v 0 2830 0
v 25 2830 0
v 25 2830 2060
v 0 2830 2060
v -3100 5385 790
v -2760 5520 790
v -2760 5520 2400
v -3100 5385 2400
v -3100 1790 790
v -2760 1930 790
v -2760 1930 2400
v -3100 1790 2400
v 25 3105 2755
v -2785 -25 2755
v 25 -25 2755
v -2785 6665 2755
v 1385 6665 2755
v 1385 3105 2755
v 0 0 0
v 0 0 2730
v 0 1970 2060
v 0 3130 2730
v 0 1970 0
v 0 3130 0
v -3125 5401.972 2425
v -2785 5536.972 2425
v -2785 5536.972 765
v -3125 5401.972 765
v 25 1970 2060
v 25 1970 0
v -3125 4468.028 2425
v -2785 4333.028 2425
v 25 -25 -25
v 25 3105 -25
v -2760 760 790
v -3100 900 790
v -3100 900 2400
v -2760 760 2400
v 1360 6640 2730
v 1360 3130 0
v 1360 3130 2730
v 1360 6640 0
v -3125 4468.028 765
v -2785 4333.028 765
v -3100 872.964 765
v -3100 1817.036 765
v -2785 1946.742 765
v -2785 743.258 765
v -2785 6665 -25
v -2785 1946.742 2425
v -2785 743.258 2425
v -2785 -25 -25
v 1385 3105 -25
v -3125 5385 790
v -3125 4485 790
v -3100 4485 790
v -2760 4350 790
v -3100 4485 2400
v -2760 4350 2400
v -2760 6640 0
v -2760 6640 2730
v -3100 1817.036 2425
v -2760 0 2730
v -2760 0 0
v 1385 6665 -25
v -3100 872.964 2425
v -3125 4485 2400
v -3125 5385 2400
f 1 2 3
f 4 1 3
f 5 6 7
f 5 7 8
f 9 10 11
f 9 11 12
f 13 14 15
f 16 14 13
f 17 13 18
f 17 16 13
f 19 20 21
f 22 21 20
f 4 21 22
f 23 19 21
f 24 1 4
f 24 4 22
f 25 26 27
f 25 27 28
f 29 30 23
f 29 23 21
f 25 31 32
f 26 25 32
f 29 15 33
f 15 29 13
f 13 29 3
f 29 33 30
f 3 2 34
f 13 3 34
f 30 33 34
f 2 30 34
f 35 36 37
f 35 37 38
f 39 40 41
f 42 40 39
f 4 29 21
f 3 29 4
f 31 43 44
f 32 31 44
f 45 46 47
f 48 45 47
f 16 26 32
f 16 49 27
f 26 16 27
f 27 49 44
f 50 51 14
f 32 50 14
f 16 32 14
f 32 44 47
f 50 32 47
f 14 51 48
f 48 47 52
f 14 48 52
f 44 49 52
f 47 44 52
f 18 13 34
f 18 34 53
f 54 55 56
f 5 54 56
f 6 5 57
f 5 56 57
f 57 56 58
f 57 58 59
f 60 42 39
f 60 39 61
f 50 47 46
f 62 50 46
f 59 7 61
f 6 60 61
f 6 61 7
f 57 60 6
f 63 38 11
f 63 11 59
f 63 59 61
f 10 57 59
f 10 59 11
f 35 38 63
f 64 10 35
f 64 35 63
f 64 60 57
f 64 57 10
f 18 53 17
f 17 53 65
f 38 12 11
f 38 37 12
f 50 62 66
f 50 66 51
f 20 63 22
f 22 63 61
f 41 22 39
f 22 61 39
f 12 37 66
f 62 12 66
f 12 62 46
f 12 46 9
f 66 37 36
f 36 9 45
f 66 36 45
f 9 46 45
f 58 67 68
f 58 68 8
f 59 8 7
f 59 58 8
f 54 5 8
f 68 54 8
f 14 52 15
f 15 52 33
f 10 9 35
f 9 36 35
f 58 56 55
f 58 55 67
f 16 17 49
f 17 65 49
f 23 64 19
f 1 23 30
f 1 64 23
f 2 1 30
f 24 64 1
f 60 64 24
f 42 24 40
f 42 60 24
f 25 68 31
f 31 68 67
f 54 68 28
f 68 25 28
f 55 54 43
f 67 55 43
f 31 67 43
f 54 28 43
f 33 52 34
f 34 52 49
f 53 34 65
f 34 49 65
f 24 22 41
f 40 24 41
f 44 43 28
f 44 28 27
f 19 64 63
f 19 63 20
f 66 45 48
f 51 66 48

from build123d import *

# Parameters (mm, degrees)
F1_DEPTH  = 2730
F3_DEPTH  = 790
F5_DEPTH  = 790
F8_DEPTH  = 330
F10_DEPTH = 330
F11_T     = 25
F12_W     = 900
F12_H     = 1610
F13_DEPTH = 25
F14_W     = 860
F14_H     = 2060
F15_DEPTH = 25


with BuildPart() as f1:
    # F0 (on Top) → F1 (new body)
    with BuildSketch(Plane.XY):
        Polygon((-2760, 0), (0, 0), (0, 3130), (1360, 3130), (1360, 6640), (-2760, 6640), (-2760, 5520), (-3100, 5385), (-3100, 4485), (-2760, 4350), (-2760, 1930), (-3100, 1790), (-3100, 900), (-2760, 760), align=None)
    extrude(amount=F1_DEPTH)

    # F2 (on face) → F3 (cut)
    with BuildSketch(Plane(origin=(0, 0, 0), x_dir=(1, 0, 0), z_dir=(0, 0, -1))):
        Polygon((-3100, -5385), (-2760, -5520), (-2760, -4350), (-3100, -4485), align=None)
    extrude(amount=-F3_DEPTH, mode=Mode.SUBTRACT)

    # F4 (on face) → F5 (cut)
    with BuildSketch(Plane(origin=(0, 0, 0), x_dir=(1, 0, 0), z_dir=(0, 0, -1))):
        Polygon((-3100, -1790), (-2760, -1930), (-2760, -760), (-3100, -900), align=None)
    extrude(amount=-F5_DEPTH, mode=Mode.SUBTRACT)

    # F7 (on offset) → F8 (cut, through all)
    with BuildSketch(Plane(origin=(0, 0, 2400), x_dir=(1, 0, 0), z_dir=(0, 0, -1))):
        Polygon((-3100, -1790), (-2760, -1930), (-2760, -760), (-3100, -900), align=None)
    extrude(amount=-F8_DEPTH, mode=Mode.SUBTRACT)

    # F9 (on offset) → F10 (cut, through all)
    with BuildSketch(Plane(origin=(0, 0, 2400), x_dir=(1, 0, 0), z_dir=(0, 0, -1))):
        Polygon((-3100, -5385), (-2760, -5520), (-2760, -4350), (-3100, -4485), align=None)
    extrude(amount=-F10_DEPTH, mode=Mode.SUBTRACT)

    # F11
    f11_openings = [f1.faces().sort_by_distance(p)[0] for p in [
        (-3100, 1345, 1595),
    ]]
    offset(amount=F11_T, openings=f11_openings, kind=Kind.INTERSECTION)

    # F12 (on face) → F13 (cut, through all)
    with BuildSketch(Plane.YZ.offset(-3100)):
        with Locations((4935, 1595)):
            Rectangle(F12_W, F12_H)
    extrude(amount=-F13_DEPTH, mode=Mode.SUBTRACT)

    # F14 (on face) → F15 (cut, through all)
    with BuildSketch(Plane.YZ.offset(25)):
        with Locations((2400, 1030)):
            Rectangle(F14_W, F14_H)
    extrude(amount=-F15_DEPTH, mode=Mode.SUBTRACT)


solid = f1.part
